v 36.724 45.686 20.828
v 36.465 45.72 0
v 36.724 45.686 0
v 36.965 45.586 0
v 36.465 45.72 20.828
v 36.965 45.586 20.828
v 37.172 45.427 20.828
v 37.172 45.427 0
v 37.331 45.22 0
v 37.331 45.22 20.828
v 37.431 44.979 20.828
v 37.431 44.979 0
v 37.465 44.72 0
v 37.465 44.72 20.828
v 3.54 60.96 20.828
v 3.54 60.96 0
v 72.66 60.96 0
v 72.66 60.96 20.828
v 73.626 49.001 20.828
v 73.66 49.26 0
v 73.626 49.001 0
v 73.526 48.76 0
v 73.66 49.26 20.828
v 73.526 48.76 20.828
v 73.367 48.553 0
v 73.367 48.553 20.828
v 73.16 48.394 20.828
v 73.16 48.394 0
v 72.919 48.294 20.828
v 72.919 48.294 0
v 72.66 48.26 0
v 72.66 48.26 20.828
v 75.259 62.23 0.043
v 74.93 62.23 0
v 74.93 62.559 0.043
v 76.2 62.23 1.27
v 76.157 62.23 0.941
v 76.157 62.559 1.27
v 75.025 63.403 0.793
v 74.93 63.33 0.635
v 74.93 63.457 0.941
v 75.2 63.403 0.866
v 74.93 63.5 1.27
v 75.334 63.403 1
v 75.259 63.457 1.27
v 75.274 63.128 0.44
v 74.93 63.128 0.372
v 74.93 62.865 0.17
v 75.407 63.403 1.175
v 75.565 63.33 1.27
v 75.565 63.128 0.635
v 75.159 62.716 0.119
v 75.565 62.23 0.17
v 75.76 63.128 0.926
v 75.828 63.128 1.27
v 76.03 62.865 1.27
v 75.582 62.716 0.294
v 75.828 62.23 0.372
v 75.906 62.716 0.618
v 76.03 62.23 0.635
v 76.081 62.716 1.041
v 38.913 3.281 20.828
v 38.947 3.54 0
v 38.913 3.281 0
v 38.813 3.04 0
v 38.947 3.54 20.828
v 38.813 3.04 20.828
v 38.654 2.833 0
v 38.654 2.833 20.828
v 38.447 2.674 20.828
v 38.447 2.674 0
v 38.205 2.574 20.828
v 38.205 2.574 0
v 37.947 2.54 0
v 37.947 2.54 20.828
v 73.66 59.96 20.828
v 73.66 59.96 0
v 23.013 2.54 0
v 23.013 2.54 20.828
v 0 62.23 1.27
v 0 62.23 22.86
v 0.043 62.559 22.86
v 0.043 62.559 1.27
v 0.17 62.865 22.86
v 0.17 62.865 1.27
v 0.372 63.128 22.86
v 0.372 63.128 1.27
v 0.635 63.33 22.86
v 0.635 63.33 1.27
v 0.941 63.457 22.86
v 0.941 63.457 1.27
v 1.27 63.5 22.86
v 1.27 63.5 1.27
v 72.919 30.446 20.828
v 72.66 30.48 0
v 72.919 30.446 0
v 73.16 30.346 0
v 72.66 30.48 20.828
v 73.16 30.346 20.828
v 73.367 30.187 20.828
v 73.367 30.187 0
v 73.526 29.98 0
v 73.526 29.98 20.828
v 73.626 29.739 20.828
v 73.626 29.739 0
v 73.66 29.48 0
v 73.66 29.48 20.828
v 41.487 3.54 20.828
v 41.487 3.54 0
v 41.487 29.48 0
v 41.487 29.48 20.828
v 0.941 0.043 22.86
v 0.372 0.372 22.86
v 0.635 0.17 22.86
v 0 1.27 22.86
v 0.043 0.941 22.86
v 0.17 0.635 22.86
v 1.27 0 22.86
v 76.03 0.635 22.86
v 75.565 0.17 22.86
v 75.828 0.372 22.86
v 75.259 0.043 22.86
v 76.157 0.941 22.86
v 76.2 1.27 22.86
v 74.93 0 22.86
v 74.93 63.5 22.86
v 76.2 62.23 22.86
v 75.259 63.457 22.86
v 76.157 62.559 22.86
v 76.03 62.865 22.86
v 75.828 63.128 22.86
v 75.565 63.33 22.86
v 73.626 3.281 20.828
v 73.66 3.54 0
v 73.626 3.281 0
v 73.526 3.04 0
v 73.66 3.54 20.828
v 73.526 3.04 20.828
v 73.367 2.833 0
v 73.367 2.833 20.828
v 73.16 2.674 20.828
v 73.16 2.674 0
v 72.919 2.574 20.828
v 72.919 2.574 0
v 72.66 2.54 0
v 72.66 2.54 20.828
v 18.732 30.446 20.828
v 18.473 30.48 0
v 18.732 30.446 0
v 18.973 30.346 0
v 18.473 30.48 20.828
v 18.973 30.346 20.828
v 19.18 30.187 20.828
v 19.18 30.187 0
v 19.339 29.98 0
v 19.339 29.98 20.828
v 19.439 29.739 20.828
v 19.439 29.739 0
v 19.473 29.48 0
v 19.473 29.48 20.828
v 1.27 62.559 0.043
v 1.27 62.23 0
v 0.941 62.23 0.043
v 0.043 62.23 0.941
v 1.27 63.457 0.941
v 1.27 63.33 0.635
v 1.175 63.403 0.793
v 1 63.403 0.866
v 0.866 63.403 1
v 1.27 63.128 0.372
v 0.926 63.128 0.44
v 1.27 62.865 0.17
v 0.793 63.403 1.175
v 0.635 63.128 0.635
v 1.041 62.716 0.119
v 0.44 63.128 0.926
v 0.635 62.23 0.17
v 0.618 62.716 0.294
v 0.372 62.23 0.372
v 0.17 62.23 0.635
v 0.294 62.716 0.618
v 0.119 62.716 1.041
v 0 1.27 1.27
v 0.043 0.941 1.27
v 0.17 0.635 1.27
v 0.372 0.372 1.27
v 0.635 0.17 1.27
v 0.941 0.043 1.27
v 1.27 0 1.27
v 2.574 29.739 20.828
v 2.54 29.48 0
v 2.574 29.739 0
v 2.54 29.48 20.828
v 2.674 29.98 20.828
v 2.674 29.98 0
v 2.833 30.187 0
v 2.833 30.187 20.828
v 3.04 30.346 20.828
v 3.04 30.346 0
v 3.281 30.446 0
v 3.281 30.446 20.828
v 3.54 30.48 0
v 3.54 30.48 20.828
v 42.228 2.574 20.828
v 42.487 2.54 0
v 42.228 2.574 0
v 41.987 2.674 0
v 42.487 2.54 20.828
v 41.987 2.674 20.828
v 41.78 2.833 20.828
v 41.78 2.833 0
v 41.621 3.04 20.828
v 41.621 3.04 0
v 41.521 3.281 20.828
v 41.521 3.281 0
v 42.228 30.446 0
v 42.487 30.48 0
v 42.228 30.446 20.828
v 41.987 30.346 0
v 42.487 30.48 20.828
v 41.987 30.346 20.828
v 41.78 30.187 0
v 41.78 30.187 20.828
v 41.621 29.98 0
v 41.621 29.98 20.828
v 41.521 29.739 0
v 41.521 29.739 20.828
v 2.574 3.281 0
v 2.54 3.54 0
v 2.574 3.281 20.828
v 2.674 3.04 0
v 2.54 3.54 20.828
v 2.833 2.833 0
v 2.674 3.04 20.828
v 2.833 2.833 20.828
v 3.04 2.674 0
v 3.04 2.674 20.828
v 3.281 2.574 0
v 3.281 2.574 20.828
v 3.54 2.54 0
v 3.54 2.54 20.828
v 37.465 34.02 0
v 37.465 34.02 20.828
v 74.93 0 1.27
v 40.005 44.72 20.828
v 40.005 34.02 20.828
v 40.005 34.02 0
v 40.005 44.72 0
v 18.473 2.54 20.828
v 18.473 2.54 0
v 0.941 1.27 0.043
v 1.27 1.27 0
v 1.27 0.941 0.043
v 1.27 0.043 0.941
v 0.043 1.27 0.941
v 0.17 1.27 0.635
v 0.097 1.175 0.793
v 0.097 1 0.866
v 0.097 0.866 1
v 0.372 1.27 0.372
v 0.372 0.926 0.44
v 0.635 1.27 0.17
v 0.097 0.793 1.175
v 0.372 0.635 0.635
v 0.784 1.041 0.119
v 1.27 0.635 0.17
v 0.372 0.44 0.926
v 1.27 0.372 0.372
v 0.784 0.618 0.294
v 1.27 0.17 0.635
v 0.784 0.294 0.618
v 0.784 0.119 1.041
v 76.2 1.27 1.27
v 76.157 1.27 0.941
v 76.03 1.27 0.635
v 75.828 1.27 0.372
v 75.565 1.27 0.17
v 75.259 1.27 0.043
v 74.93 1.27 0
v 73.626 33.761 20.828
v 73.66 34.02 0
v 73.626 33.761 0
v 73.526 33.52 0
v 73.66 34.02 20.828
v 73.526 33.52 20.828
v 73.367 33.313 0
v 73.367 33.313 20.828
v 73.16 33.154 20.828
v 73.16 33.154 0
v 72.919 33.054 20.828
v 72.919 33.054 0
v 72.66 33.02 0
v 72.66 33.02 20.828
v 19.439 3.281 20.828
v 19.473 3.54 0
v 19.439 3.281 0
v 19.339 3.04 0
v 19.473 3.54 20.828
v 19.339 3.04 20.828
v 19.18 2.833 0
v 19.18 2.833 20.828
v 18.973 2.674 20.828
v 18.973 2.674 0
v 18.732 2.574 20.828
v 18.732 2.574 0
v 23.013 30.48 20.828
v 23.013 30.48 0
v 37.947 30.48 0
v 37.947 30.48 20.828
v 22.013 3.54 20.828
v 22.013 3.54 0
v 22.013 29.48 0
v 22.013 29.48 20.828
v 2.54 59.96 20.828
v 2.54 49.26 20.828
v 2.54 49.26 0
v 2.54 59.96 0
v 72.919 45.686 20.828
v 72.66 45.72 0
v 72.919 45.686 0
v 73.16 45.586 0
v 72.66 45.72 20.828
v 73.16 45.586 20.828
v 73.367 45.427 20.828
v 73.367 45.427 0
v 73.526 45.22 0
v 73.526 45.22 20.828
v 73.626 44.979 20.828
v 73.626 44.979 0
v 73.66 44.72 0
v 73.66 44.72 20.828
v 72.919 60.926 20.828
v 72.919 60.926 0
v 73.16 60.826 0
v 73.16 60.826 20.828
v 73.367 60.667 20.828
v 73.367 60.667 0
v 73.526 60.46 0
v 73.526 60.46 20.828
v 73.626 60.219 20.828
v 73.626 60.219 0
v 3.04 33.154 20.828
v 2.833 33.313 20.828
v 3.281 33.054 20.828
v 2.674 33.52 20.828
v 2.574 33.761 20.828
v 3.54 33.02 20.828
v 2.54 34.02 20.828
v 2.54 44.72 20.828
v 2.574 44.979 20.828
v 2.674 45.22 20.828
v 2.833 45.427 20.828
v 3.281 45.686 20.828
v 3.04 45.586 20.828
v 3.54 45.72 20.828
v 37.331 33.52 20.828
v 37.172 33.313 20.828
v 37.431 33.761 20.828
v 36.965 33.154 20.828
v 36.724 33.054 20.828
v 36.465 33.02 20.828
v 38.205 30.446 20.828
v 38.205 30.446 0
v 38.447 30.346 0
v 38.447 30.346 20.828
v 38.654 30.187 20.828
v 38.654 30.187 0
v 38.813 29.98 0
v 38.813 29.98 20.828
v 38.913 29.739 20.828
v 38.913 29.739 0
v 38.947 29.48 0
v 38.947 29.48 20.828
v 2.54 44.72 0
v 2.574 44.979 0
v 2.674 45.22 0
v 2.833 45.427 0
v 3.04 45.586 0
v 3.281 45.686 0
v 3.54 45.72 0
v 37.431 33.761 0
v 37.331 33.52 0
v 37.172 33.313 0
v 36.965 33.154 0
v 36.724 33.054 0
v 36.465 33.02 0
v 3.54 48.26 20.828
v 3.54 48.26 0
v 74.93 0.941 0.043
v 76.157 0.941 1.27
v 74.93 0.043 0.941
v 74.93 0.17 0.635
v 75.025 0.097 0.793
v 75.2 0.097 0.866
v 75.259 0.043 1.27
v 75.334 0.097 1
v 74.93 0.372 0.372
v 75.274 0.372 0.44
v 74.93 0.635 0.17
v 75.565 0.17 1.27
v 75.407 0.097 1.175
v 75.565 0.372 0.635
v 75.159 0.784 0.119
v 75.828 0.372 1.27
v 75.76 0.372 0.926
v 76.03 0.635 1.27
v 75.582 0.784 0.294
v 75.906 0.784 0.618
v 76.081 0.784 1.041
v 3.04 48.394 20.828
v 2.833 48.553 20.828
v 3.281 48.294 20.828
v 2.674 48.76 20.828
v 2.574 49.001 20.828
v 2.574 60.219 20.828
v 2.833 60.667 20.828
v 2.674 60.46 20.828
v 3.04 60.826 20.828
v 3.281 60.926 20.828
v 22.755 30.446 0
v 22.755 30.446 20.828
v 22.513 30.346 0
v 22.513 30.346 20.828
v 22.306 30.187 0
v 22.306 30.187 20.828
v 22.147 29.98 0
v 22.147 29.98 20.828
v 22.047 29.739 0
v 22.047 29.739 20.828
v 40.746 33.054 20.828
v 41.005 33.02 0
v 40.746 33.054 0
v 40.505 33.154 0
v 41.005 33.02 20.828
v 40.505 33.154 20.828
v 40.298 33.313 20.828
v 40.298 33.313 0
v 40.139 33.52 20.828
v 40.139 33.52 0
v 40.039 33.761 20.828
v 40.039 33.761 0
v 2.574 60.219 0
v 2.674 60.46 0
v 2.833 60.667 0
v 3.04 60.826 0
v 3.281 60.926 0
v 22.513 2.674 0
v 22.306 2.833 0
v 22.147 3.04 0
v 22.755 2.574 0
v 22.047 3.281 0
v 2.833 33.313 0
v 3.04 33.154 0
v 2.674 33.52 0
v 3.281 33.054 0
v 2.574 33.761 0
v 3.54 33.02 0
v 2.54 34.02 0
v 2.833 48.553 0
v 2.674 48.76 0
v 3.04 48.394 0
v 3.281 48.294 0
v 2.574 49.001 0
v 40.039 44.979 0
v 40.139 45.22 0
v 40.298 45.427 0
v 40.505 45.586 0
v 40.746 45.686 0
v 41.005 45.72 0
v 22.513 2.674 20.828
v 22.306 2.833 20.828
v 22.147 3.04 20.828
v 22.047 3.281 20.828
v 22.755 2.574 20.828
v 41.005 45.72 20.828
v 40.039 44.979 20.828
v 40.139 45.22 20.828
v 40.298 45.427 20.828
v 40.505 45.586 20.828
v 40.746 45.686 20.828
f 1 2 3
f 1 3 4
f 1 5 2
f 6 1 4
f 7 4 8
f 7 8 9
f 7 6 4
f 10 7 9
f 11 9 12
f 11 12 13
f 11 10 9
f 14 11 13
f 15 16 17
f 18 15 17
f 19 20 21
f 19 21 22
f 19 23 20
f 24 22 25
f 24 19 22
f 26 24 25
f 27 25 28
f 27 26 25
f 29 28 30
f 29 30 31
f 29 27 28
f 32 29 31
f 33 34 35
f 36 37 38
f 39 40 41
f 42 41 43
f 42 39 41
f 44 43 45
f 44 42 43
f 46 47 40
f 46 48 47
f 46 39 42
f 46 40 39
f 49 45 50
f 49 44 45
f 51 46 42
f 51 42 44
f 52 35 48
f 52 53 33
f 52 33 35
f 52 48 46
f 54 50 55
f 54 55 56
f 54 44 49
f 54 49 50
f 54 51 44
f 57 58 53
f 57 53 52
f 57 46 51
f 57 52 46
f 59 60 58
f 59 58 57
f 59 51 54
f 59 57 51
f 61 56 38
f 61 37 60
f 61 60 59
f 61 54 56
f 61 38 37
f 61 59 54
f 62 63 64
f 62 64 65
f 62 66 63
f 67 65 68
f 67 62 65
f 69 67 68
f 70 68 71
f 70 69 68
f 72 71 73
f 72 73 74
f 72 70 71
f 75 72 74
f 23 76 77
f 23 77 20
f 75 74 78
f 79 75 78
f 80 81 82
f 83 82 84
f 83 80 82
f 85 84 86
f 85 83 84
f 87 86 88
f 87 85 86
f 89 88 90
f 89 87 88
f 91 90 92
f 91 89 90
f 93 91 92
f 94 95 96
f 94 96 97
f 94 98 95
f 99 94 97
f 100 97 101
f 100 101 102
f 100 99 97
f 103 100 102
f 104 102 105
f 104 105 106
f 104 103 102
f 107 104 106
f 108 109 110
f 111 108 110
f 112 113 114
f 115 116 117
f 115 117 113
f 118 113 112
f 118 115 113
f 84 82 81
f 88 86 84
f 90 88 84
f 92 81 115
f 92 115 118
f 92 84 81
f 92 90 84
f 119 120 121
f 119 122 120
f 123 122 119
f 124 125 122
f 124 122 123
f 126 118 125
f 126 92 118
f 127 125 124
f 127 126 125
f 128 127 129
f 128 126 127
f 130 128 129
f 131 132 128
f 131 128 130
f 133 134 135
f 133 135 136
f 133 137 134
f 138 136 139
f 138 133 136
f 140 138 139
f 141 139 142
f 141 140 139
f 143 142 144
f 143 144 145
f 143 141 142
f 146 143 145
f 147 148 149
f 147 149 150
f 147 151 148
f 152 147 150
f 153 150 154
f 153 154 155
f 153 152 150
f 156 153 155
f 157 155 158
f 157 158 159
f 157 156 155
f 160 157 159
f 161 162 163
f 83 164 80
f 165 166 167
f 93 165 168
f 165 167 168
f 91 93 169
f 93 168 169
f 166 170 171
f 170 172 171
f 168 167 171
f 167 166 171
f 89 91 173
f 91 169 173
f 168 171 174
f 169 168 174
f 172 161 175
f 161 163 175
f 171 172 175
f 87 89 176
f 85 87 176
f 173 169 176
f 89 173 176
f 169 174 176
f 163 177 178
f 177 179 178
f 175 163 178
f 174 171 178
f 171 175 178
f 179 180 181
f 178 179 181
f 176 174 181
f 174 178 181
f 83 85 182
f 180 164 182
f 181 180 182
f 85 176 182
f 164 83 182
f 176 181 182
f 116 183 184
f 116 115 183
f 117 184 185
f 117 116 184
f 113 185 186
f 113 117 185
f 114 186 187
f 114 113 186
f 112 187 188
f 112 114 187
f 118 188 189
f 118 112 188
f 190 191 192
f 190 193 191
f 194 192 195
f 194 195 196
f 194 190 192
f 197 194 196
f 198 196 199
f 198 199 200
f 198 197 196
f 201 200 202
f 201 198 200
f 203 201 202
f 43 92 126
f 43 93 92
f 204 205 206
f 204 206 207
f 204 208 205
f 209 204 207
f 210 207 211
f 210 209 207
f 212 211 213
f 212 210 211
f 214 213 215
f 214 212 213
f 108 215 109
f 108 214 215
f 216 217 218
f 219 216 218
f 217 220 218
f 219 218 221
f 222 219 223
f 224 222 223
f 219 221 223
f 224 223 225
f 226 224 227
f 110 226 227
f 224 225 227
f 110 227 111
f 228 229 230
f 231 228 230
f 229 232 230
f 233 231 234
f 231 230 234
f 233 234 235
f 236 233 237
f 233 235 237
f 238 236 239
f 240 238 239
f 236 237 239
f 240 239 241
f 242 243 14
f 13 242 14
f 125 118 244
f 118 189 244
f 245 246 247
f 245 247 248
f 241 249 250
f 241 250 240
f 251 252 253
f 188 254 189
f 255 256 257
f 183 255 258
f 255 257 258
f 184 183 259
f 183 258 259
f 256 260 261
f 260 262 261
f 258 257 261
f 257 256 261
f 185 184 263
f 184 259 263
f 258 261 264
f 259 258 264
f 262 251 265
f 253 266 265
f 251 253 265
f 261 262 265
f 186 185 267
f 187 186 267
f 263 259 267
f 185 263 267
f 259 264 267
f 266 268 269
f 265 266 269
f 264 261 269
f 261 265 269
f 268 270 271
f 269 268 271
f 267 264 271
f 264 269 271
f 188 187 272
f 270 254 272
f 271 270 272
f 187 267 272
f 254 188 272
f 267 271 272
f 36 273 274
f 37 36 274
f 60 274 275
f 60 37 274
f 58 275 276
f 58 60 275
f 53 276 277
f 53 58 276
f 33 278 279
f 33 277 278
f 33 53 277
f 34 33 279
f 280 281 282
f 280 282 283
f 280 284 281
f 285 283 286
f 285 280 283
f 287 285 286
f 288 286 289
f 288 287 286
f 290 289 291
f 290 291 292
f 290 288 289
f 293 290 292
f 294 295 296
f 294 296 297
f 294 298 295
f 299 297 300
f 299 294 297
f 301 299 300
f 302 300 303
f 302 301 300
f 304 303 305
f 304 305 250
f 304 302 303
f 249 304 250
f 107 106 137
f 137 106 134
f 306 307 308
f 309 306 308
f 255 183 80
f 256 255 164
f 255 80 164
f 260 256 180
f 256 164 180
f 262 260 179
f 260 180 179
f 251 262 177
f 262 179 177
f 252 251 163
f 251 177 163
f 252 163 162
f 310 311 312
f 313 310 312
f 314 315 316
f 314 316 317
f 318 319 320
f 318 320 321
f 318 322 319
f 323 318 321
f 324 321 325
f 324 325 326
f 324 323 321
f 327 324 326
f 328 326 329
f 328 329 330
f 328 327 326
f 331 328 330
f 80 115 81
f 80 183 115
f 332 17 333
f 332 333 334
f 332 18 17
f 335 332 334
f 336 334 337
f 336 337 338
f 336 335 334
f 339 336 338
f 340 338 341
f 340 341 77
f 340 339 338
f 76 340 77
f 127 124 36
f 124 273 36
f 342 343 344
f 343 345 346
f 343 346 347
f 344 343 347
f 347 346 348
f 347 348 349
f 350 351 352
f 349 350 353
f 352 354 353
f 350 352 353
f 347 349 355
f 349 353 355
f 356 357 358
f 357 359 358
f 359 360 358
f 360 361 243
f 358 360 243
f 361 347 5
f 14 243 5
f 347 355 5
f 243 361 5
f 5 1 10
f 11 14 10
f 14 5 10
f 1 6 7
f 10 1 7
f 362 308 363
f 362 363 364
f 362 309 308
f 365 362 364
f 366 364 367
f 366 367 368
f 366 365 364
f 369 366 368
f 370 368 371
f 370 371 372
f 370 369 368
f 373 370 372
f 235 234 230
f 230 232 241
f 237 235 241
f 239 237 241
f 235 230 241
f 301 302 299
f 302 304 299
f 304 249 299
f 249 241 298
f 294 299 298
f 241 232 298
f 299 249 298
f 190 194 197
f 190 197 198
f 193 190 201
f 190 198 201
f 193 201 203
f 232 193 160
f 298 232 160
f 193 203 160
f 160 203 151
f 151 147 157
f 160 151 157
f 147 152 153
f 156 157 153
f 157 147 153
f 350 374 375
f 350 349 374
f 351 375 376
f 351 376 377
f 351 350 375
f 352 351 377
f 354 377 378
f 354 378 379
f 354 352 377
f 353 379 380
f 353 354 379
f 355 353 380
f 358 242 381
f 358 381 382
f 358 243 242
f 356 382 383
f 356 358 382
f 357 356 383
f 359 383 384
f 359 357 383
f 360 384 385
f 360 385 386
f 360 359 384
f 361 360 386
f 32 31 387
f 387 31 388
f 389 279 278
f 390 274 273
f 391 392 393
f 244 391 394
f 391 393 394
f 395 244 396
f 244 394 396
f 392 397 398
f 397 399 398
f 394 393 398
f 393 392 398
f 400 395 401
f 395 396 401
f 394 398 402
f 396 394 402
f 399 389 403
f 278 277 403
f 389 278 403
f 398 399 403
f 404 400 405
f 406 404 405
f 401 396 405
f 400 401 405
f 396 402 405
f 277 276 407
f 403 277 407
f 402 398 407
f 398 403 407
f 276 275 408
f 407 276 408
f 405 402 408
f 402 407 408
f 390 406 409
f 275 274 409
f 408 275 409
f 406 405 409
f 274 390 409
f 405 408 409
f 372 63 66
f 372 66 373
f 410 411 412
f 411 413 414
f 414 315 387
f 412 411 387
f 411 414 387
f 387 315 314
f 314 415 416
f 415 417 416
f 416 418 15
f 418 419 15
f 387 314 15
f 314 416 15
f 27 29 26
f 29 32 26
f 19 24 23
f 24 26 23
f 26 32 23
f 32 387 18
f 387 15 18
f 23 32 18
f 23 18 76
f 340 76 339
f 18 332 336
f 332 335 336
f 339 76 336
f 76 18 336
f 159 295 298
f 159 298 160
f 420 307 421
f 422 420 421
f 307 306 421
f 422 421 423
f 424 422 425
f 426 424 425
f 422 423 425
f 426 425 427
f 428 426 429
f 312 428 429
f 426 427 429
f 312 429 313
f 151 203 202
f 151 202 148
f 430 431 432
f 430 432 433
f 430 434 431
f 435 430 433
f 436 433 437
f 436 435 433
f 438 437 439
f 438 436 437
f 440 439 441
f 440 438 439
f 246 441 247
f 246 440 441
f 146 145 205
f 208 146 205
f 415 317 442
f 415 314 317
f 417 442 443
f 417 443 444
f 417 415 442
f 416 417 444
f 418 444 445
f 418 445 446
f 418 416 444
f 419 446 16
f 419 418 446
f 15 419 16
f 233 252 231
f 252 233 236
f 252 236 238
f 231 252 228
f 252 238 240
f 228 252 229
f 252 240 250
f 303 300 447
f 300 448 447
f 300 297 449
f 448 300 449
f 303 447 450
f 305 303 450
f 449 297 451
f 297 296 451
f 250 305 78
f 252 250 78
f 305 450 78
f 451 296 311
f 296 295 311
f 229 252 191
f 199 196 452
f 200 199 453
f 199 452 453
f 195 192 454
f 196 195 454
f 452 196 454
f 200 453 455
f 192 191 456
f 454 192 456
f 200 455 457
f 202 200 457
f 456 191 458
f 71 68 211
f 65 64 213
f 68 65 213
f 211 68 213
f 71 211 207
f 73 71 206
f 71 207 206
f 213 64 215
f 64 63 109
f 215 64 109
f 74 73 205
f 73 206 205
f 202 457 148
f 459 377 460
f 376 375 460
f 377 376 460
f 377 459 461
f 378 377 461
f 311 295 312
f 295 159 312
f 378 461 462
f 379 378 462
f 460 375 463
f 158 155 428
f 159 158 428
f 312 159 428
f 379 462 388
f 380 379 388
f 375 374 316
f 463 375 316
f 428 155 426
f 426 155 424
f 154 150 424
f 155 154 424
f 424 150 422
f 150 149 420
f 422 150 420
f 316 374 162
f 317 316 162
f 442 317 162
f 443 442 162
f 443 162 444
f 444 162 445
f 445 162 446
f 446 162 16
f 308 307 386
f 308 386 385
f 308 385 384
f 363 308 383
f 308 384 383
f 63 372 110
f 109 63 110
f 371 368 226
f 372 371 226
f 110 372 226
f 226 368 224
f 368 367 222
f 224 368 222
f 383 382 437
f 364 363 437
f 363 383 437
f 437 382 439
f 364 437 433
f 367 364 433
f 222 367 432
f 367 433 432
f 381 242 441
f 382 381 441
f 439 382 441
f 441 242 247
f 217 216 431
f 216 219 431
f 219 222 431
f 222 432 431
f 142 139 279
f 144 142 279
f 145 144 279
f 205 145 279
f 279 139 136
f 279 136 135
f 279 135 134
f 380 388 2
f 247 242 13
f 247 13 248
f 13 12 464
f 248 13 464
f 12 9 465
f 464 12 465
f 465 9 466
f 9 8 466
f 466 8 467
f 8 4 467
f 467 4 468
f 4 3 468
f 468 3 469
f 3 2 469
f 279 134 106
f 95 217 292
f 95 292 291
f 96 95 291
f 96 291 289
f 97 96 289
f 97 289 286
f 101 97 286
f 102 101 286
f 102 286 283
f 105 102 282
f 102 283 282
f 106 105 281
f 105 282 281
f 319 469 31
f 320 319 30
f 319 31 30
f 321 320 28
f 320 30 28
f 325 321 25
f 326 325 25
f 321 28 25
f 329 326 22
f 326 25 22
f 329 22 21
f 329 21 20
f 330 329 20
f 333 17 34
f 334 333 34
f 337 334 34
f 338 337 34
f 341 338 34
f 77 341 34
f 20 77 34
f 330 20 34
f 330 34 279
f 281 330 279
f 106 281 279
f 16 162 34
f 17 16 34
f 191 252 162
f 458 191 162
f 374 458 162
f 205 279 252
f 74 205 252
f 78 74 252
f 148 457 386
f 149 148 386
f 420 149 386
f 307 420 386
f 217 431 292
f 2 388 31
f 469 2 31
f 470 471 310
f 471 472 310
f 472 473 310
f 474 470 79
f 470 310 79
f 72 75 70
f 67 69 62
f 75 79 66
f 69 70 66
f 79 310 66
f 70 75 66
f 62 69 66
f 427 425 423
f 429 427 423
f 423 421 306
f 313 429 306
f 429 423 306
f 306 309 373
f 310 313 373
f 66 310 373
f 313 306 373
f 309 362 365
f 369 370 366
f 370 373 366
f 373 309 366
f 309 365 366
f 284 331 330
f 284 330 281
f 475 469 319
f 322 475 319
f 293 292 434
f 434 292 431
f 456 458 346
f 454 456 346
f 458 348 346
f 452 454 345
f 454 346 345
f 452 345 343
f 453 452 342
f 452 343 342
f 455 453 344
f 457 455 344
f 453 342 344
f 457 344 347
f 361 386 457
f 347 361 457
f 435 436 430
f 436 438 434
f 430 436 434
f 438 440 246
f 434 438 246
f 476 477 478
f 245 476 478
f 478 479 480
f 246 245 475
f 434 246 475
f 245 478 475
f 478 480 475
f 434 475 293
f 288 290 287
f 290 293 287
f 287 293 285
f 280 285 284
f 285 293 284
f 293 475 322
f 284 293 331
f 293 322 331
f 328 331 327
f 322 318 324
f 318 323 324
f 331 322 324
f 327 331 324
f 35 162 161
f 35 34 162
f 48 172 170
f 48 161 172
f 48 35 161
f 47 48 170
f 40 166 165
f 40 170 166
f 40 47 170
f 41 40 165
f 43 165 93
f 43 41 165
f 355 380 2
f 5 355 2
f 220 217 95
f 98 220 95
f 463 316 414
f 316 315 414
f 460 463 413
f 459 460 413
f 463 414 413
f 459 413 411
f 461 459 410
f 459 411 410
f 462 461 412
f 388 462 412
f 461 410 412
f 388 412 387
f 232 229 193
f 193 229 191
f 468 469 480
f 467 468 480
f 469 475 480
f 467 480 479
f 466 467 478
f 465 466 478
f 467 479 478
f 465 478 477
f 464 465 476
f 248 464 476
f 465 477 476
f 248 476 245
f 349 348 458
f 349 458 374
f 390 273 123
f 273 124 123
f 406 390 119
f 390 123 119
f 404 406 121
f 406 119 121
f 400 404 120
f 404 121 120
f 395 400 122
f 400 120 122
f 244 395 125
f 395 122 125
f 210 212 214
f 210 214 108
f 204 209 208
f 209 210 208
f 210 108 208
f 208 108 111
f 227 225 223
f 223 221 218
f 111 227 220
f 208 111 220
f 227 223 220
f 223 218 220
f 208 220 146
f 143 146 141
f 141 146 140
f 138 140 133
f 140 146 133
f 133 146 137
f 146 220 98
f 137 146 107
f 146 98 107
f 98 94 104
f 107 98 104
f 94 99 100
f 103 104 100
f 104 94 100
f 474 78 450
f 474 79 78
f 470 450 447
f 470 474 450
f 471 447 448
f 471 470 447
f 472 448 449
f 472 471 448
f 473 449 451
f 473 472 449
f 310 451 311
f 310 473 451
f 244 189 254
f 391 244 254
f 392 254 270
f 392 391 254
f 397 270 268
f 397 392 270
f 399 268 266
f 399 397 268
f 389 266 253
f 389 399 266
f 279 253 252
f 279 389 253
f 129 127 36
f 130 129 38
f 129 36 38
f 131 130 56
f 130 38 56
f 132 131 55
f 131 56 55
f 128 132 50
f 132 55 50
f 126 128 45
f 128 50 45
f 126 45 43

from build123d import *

# Parameters (mm, degrees)
F0_W     = 76.2
F0_H     = 63.5
F0_W_2   = 2.54
F0_H_2   = 27.94
F0_H_3   = 12.7
F1_DEPTH = 22.86
F2_W     = 76.2
F2_H     = 63.5
F3_DEPTH = 2.032
F4_R     = 1.27
F5_R     = 1


with BuildPart() as f1:
    # F0 (on Top) → F1 (new body)
    with BuildSketch(Plane.XY):
        with Locations((38.1, 31.75)):
            Rectangle(F0_W, F0_H)
        Polygon((2.54, 48.26), (2.54, 60.96), (73.66, 60.96), (73.66, 48.26), (73.66, 45.72), (73.66, 33.02), (73.66, 30.48), (73.66, 2.54), (41.4866666667, 2.54), (38.9466666667, 2.54), (22.0133333333, 2.54), (19.4733333333, 2.54), (2.54, 2.54), (2.54, 30.48), (2.54, 33.02), (2.54, 45.72), align=None, mode=Mode.SUBTRACT)
        Polygon((73.66, 48.26), (2.54, 48.26), (2.54, 45.72), (37.465, 45.72), (40.005, 45.72), (73.66, 45.72), align=None)
        Polygon((37.465, 33.02), (2.54, 33.02), (2.54, 30.48), (19.4733333333, 30.48), (22.0133333333, 30.48), (38.9466666667, 30.48), (41.4866666667, 30.48), (73.66, 30.48), (73.66, 33.02), (40.005, 33.02), align=None)
        with Locations((20.7433333333, 16.51)):
            Rectangle(F0_W_2, F0_H_2)
        with Locations((40.2166666667, 16.51)):
            Rectangle(F0_W_2, F0_H_2)
        with Locations((38.735, 39.37)):
            Rectangle(F0_W_2, F0_H_3)
    extrude(amount=F1_DEPTH)

    # F2 (on face) → F3 (join)
    with BuildSketch(Plane.XY.offset(22.86)):
        with Locations((38.1, 31.75)):
            Rectangle(F2_W, F2_H)
    extrude(amount=-F3_DEPTH)

    # F4
    f4_edges = [f1.edges().sort_by_distance(p)[0] for p in [
        (76.2, 31.75, 0),
        (38.1, 0, 0),
        (0, 31.75, 0),
        (38.1, 63.5, 0),
        (0, 63.5, 11.43),
        (76.2, 63.5, 11.43),
        (0, 0, 11.43),
        (76.2, 0, 11.43),
    ]]
    fillet(f4_edges, radius=F4_R)

    # F5
    f5_edges = [f1.edges().sort_by_distance(p)[0] for p in [
        (73.66, 60.96, 10.414),
        (73.66, 48.26, 10.414),
        (73.66, 33.02, 10.414),
        (73.66, 2.54, 10.414),
        (38.946667, 2.54, 10.414),
        (19.473333, 2.54, 10.414),
        (19.473333, 30.48, 10.414),
        (38.946667, 30.48, 10.414),
        (2.54, 30.48, 10.414),
        (2.54, 2.54, 10.414),
        (2.54, 45.72, 10.414),
        (2.54, 33.02, 10.414),
        (73.66, 45.72, 10.414),
        (41.486667, 30.48, 10.414),
        (41.486667, 2.54, 10.414),
        (2.54, 60.96, 10.414),
        (2.54, 48.26, 10.414),
        (73.66, 30.48, 10.414),
        (22.013333, 2.54, 10.414),
        (22.013333, 30.48, 10.414),
        (40.005, 33.02, 10.414),
        (40.005, 45.72, 10.414),
        (37.465, 45.72, 10.414),
        (37.465, 33.02, 10.414),
    ]]
    fillet(f5_edges, radius=F5_R)


solid = f1.part
